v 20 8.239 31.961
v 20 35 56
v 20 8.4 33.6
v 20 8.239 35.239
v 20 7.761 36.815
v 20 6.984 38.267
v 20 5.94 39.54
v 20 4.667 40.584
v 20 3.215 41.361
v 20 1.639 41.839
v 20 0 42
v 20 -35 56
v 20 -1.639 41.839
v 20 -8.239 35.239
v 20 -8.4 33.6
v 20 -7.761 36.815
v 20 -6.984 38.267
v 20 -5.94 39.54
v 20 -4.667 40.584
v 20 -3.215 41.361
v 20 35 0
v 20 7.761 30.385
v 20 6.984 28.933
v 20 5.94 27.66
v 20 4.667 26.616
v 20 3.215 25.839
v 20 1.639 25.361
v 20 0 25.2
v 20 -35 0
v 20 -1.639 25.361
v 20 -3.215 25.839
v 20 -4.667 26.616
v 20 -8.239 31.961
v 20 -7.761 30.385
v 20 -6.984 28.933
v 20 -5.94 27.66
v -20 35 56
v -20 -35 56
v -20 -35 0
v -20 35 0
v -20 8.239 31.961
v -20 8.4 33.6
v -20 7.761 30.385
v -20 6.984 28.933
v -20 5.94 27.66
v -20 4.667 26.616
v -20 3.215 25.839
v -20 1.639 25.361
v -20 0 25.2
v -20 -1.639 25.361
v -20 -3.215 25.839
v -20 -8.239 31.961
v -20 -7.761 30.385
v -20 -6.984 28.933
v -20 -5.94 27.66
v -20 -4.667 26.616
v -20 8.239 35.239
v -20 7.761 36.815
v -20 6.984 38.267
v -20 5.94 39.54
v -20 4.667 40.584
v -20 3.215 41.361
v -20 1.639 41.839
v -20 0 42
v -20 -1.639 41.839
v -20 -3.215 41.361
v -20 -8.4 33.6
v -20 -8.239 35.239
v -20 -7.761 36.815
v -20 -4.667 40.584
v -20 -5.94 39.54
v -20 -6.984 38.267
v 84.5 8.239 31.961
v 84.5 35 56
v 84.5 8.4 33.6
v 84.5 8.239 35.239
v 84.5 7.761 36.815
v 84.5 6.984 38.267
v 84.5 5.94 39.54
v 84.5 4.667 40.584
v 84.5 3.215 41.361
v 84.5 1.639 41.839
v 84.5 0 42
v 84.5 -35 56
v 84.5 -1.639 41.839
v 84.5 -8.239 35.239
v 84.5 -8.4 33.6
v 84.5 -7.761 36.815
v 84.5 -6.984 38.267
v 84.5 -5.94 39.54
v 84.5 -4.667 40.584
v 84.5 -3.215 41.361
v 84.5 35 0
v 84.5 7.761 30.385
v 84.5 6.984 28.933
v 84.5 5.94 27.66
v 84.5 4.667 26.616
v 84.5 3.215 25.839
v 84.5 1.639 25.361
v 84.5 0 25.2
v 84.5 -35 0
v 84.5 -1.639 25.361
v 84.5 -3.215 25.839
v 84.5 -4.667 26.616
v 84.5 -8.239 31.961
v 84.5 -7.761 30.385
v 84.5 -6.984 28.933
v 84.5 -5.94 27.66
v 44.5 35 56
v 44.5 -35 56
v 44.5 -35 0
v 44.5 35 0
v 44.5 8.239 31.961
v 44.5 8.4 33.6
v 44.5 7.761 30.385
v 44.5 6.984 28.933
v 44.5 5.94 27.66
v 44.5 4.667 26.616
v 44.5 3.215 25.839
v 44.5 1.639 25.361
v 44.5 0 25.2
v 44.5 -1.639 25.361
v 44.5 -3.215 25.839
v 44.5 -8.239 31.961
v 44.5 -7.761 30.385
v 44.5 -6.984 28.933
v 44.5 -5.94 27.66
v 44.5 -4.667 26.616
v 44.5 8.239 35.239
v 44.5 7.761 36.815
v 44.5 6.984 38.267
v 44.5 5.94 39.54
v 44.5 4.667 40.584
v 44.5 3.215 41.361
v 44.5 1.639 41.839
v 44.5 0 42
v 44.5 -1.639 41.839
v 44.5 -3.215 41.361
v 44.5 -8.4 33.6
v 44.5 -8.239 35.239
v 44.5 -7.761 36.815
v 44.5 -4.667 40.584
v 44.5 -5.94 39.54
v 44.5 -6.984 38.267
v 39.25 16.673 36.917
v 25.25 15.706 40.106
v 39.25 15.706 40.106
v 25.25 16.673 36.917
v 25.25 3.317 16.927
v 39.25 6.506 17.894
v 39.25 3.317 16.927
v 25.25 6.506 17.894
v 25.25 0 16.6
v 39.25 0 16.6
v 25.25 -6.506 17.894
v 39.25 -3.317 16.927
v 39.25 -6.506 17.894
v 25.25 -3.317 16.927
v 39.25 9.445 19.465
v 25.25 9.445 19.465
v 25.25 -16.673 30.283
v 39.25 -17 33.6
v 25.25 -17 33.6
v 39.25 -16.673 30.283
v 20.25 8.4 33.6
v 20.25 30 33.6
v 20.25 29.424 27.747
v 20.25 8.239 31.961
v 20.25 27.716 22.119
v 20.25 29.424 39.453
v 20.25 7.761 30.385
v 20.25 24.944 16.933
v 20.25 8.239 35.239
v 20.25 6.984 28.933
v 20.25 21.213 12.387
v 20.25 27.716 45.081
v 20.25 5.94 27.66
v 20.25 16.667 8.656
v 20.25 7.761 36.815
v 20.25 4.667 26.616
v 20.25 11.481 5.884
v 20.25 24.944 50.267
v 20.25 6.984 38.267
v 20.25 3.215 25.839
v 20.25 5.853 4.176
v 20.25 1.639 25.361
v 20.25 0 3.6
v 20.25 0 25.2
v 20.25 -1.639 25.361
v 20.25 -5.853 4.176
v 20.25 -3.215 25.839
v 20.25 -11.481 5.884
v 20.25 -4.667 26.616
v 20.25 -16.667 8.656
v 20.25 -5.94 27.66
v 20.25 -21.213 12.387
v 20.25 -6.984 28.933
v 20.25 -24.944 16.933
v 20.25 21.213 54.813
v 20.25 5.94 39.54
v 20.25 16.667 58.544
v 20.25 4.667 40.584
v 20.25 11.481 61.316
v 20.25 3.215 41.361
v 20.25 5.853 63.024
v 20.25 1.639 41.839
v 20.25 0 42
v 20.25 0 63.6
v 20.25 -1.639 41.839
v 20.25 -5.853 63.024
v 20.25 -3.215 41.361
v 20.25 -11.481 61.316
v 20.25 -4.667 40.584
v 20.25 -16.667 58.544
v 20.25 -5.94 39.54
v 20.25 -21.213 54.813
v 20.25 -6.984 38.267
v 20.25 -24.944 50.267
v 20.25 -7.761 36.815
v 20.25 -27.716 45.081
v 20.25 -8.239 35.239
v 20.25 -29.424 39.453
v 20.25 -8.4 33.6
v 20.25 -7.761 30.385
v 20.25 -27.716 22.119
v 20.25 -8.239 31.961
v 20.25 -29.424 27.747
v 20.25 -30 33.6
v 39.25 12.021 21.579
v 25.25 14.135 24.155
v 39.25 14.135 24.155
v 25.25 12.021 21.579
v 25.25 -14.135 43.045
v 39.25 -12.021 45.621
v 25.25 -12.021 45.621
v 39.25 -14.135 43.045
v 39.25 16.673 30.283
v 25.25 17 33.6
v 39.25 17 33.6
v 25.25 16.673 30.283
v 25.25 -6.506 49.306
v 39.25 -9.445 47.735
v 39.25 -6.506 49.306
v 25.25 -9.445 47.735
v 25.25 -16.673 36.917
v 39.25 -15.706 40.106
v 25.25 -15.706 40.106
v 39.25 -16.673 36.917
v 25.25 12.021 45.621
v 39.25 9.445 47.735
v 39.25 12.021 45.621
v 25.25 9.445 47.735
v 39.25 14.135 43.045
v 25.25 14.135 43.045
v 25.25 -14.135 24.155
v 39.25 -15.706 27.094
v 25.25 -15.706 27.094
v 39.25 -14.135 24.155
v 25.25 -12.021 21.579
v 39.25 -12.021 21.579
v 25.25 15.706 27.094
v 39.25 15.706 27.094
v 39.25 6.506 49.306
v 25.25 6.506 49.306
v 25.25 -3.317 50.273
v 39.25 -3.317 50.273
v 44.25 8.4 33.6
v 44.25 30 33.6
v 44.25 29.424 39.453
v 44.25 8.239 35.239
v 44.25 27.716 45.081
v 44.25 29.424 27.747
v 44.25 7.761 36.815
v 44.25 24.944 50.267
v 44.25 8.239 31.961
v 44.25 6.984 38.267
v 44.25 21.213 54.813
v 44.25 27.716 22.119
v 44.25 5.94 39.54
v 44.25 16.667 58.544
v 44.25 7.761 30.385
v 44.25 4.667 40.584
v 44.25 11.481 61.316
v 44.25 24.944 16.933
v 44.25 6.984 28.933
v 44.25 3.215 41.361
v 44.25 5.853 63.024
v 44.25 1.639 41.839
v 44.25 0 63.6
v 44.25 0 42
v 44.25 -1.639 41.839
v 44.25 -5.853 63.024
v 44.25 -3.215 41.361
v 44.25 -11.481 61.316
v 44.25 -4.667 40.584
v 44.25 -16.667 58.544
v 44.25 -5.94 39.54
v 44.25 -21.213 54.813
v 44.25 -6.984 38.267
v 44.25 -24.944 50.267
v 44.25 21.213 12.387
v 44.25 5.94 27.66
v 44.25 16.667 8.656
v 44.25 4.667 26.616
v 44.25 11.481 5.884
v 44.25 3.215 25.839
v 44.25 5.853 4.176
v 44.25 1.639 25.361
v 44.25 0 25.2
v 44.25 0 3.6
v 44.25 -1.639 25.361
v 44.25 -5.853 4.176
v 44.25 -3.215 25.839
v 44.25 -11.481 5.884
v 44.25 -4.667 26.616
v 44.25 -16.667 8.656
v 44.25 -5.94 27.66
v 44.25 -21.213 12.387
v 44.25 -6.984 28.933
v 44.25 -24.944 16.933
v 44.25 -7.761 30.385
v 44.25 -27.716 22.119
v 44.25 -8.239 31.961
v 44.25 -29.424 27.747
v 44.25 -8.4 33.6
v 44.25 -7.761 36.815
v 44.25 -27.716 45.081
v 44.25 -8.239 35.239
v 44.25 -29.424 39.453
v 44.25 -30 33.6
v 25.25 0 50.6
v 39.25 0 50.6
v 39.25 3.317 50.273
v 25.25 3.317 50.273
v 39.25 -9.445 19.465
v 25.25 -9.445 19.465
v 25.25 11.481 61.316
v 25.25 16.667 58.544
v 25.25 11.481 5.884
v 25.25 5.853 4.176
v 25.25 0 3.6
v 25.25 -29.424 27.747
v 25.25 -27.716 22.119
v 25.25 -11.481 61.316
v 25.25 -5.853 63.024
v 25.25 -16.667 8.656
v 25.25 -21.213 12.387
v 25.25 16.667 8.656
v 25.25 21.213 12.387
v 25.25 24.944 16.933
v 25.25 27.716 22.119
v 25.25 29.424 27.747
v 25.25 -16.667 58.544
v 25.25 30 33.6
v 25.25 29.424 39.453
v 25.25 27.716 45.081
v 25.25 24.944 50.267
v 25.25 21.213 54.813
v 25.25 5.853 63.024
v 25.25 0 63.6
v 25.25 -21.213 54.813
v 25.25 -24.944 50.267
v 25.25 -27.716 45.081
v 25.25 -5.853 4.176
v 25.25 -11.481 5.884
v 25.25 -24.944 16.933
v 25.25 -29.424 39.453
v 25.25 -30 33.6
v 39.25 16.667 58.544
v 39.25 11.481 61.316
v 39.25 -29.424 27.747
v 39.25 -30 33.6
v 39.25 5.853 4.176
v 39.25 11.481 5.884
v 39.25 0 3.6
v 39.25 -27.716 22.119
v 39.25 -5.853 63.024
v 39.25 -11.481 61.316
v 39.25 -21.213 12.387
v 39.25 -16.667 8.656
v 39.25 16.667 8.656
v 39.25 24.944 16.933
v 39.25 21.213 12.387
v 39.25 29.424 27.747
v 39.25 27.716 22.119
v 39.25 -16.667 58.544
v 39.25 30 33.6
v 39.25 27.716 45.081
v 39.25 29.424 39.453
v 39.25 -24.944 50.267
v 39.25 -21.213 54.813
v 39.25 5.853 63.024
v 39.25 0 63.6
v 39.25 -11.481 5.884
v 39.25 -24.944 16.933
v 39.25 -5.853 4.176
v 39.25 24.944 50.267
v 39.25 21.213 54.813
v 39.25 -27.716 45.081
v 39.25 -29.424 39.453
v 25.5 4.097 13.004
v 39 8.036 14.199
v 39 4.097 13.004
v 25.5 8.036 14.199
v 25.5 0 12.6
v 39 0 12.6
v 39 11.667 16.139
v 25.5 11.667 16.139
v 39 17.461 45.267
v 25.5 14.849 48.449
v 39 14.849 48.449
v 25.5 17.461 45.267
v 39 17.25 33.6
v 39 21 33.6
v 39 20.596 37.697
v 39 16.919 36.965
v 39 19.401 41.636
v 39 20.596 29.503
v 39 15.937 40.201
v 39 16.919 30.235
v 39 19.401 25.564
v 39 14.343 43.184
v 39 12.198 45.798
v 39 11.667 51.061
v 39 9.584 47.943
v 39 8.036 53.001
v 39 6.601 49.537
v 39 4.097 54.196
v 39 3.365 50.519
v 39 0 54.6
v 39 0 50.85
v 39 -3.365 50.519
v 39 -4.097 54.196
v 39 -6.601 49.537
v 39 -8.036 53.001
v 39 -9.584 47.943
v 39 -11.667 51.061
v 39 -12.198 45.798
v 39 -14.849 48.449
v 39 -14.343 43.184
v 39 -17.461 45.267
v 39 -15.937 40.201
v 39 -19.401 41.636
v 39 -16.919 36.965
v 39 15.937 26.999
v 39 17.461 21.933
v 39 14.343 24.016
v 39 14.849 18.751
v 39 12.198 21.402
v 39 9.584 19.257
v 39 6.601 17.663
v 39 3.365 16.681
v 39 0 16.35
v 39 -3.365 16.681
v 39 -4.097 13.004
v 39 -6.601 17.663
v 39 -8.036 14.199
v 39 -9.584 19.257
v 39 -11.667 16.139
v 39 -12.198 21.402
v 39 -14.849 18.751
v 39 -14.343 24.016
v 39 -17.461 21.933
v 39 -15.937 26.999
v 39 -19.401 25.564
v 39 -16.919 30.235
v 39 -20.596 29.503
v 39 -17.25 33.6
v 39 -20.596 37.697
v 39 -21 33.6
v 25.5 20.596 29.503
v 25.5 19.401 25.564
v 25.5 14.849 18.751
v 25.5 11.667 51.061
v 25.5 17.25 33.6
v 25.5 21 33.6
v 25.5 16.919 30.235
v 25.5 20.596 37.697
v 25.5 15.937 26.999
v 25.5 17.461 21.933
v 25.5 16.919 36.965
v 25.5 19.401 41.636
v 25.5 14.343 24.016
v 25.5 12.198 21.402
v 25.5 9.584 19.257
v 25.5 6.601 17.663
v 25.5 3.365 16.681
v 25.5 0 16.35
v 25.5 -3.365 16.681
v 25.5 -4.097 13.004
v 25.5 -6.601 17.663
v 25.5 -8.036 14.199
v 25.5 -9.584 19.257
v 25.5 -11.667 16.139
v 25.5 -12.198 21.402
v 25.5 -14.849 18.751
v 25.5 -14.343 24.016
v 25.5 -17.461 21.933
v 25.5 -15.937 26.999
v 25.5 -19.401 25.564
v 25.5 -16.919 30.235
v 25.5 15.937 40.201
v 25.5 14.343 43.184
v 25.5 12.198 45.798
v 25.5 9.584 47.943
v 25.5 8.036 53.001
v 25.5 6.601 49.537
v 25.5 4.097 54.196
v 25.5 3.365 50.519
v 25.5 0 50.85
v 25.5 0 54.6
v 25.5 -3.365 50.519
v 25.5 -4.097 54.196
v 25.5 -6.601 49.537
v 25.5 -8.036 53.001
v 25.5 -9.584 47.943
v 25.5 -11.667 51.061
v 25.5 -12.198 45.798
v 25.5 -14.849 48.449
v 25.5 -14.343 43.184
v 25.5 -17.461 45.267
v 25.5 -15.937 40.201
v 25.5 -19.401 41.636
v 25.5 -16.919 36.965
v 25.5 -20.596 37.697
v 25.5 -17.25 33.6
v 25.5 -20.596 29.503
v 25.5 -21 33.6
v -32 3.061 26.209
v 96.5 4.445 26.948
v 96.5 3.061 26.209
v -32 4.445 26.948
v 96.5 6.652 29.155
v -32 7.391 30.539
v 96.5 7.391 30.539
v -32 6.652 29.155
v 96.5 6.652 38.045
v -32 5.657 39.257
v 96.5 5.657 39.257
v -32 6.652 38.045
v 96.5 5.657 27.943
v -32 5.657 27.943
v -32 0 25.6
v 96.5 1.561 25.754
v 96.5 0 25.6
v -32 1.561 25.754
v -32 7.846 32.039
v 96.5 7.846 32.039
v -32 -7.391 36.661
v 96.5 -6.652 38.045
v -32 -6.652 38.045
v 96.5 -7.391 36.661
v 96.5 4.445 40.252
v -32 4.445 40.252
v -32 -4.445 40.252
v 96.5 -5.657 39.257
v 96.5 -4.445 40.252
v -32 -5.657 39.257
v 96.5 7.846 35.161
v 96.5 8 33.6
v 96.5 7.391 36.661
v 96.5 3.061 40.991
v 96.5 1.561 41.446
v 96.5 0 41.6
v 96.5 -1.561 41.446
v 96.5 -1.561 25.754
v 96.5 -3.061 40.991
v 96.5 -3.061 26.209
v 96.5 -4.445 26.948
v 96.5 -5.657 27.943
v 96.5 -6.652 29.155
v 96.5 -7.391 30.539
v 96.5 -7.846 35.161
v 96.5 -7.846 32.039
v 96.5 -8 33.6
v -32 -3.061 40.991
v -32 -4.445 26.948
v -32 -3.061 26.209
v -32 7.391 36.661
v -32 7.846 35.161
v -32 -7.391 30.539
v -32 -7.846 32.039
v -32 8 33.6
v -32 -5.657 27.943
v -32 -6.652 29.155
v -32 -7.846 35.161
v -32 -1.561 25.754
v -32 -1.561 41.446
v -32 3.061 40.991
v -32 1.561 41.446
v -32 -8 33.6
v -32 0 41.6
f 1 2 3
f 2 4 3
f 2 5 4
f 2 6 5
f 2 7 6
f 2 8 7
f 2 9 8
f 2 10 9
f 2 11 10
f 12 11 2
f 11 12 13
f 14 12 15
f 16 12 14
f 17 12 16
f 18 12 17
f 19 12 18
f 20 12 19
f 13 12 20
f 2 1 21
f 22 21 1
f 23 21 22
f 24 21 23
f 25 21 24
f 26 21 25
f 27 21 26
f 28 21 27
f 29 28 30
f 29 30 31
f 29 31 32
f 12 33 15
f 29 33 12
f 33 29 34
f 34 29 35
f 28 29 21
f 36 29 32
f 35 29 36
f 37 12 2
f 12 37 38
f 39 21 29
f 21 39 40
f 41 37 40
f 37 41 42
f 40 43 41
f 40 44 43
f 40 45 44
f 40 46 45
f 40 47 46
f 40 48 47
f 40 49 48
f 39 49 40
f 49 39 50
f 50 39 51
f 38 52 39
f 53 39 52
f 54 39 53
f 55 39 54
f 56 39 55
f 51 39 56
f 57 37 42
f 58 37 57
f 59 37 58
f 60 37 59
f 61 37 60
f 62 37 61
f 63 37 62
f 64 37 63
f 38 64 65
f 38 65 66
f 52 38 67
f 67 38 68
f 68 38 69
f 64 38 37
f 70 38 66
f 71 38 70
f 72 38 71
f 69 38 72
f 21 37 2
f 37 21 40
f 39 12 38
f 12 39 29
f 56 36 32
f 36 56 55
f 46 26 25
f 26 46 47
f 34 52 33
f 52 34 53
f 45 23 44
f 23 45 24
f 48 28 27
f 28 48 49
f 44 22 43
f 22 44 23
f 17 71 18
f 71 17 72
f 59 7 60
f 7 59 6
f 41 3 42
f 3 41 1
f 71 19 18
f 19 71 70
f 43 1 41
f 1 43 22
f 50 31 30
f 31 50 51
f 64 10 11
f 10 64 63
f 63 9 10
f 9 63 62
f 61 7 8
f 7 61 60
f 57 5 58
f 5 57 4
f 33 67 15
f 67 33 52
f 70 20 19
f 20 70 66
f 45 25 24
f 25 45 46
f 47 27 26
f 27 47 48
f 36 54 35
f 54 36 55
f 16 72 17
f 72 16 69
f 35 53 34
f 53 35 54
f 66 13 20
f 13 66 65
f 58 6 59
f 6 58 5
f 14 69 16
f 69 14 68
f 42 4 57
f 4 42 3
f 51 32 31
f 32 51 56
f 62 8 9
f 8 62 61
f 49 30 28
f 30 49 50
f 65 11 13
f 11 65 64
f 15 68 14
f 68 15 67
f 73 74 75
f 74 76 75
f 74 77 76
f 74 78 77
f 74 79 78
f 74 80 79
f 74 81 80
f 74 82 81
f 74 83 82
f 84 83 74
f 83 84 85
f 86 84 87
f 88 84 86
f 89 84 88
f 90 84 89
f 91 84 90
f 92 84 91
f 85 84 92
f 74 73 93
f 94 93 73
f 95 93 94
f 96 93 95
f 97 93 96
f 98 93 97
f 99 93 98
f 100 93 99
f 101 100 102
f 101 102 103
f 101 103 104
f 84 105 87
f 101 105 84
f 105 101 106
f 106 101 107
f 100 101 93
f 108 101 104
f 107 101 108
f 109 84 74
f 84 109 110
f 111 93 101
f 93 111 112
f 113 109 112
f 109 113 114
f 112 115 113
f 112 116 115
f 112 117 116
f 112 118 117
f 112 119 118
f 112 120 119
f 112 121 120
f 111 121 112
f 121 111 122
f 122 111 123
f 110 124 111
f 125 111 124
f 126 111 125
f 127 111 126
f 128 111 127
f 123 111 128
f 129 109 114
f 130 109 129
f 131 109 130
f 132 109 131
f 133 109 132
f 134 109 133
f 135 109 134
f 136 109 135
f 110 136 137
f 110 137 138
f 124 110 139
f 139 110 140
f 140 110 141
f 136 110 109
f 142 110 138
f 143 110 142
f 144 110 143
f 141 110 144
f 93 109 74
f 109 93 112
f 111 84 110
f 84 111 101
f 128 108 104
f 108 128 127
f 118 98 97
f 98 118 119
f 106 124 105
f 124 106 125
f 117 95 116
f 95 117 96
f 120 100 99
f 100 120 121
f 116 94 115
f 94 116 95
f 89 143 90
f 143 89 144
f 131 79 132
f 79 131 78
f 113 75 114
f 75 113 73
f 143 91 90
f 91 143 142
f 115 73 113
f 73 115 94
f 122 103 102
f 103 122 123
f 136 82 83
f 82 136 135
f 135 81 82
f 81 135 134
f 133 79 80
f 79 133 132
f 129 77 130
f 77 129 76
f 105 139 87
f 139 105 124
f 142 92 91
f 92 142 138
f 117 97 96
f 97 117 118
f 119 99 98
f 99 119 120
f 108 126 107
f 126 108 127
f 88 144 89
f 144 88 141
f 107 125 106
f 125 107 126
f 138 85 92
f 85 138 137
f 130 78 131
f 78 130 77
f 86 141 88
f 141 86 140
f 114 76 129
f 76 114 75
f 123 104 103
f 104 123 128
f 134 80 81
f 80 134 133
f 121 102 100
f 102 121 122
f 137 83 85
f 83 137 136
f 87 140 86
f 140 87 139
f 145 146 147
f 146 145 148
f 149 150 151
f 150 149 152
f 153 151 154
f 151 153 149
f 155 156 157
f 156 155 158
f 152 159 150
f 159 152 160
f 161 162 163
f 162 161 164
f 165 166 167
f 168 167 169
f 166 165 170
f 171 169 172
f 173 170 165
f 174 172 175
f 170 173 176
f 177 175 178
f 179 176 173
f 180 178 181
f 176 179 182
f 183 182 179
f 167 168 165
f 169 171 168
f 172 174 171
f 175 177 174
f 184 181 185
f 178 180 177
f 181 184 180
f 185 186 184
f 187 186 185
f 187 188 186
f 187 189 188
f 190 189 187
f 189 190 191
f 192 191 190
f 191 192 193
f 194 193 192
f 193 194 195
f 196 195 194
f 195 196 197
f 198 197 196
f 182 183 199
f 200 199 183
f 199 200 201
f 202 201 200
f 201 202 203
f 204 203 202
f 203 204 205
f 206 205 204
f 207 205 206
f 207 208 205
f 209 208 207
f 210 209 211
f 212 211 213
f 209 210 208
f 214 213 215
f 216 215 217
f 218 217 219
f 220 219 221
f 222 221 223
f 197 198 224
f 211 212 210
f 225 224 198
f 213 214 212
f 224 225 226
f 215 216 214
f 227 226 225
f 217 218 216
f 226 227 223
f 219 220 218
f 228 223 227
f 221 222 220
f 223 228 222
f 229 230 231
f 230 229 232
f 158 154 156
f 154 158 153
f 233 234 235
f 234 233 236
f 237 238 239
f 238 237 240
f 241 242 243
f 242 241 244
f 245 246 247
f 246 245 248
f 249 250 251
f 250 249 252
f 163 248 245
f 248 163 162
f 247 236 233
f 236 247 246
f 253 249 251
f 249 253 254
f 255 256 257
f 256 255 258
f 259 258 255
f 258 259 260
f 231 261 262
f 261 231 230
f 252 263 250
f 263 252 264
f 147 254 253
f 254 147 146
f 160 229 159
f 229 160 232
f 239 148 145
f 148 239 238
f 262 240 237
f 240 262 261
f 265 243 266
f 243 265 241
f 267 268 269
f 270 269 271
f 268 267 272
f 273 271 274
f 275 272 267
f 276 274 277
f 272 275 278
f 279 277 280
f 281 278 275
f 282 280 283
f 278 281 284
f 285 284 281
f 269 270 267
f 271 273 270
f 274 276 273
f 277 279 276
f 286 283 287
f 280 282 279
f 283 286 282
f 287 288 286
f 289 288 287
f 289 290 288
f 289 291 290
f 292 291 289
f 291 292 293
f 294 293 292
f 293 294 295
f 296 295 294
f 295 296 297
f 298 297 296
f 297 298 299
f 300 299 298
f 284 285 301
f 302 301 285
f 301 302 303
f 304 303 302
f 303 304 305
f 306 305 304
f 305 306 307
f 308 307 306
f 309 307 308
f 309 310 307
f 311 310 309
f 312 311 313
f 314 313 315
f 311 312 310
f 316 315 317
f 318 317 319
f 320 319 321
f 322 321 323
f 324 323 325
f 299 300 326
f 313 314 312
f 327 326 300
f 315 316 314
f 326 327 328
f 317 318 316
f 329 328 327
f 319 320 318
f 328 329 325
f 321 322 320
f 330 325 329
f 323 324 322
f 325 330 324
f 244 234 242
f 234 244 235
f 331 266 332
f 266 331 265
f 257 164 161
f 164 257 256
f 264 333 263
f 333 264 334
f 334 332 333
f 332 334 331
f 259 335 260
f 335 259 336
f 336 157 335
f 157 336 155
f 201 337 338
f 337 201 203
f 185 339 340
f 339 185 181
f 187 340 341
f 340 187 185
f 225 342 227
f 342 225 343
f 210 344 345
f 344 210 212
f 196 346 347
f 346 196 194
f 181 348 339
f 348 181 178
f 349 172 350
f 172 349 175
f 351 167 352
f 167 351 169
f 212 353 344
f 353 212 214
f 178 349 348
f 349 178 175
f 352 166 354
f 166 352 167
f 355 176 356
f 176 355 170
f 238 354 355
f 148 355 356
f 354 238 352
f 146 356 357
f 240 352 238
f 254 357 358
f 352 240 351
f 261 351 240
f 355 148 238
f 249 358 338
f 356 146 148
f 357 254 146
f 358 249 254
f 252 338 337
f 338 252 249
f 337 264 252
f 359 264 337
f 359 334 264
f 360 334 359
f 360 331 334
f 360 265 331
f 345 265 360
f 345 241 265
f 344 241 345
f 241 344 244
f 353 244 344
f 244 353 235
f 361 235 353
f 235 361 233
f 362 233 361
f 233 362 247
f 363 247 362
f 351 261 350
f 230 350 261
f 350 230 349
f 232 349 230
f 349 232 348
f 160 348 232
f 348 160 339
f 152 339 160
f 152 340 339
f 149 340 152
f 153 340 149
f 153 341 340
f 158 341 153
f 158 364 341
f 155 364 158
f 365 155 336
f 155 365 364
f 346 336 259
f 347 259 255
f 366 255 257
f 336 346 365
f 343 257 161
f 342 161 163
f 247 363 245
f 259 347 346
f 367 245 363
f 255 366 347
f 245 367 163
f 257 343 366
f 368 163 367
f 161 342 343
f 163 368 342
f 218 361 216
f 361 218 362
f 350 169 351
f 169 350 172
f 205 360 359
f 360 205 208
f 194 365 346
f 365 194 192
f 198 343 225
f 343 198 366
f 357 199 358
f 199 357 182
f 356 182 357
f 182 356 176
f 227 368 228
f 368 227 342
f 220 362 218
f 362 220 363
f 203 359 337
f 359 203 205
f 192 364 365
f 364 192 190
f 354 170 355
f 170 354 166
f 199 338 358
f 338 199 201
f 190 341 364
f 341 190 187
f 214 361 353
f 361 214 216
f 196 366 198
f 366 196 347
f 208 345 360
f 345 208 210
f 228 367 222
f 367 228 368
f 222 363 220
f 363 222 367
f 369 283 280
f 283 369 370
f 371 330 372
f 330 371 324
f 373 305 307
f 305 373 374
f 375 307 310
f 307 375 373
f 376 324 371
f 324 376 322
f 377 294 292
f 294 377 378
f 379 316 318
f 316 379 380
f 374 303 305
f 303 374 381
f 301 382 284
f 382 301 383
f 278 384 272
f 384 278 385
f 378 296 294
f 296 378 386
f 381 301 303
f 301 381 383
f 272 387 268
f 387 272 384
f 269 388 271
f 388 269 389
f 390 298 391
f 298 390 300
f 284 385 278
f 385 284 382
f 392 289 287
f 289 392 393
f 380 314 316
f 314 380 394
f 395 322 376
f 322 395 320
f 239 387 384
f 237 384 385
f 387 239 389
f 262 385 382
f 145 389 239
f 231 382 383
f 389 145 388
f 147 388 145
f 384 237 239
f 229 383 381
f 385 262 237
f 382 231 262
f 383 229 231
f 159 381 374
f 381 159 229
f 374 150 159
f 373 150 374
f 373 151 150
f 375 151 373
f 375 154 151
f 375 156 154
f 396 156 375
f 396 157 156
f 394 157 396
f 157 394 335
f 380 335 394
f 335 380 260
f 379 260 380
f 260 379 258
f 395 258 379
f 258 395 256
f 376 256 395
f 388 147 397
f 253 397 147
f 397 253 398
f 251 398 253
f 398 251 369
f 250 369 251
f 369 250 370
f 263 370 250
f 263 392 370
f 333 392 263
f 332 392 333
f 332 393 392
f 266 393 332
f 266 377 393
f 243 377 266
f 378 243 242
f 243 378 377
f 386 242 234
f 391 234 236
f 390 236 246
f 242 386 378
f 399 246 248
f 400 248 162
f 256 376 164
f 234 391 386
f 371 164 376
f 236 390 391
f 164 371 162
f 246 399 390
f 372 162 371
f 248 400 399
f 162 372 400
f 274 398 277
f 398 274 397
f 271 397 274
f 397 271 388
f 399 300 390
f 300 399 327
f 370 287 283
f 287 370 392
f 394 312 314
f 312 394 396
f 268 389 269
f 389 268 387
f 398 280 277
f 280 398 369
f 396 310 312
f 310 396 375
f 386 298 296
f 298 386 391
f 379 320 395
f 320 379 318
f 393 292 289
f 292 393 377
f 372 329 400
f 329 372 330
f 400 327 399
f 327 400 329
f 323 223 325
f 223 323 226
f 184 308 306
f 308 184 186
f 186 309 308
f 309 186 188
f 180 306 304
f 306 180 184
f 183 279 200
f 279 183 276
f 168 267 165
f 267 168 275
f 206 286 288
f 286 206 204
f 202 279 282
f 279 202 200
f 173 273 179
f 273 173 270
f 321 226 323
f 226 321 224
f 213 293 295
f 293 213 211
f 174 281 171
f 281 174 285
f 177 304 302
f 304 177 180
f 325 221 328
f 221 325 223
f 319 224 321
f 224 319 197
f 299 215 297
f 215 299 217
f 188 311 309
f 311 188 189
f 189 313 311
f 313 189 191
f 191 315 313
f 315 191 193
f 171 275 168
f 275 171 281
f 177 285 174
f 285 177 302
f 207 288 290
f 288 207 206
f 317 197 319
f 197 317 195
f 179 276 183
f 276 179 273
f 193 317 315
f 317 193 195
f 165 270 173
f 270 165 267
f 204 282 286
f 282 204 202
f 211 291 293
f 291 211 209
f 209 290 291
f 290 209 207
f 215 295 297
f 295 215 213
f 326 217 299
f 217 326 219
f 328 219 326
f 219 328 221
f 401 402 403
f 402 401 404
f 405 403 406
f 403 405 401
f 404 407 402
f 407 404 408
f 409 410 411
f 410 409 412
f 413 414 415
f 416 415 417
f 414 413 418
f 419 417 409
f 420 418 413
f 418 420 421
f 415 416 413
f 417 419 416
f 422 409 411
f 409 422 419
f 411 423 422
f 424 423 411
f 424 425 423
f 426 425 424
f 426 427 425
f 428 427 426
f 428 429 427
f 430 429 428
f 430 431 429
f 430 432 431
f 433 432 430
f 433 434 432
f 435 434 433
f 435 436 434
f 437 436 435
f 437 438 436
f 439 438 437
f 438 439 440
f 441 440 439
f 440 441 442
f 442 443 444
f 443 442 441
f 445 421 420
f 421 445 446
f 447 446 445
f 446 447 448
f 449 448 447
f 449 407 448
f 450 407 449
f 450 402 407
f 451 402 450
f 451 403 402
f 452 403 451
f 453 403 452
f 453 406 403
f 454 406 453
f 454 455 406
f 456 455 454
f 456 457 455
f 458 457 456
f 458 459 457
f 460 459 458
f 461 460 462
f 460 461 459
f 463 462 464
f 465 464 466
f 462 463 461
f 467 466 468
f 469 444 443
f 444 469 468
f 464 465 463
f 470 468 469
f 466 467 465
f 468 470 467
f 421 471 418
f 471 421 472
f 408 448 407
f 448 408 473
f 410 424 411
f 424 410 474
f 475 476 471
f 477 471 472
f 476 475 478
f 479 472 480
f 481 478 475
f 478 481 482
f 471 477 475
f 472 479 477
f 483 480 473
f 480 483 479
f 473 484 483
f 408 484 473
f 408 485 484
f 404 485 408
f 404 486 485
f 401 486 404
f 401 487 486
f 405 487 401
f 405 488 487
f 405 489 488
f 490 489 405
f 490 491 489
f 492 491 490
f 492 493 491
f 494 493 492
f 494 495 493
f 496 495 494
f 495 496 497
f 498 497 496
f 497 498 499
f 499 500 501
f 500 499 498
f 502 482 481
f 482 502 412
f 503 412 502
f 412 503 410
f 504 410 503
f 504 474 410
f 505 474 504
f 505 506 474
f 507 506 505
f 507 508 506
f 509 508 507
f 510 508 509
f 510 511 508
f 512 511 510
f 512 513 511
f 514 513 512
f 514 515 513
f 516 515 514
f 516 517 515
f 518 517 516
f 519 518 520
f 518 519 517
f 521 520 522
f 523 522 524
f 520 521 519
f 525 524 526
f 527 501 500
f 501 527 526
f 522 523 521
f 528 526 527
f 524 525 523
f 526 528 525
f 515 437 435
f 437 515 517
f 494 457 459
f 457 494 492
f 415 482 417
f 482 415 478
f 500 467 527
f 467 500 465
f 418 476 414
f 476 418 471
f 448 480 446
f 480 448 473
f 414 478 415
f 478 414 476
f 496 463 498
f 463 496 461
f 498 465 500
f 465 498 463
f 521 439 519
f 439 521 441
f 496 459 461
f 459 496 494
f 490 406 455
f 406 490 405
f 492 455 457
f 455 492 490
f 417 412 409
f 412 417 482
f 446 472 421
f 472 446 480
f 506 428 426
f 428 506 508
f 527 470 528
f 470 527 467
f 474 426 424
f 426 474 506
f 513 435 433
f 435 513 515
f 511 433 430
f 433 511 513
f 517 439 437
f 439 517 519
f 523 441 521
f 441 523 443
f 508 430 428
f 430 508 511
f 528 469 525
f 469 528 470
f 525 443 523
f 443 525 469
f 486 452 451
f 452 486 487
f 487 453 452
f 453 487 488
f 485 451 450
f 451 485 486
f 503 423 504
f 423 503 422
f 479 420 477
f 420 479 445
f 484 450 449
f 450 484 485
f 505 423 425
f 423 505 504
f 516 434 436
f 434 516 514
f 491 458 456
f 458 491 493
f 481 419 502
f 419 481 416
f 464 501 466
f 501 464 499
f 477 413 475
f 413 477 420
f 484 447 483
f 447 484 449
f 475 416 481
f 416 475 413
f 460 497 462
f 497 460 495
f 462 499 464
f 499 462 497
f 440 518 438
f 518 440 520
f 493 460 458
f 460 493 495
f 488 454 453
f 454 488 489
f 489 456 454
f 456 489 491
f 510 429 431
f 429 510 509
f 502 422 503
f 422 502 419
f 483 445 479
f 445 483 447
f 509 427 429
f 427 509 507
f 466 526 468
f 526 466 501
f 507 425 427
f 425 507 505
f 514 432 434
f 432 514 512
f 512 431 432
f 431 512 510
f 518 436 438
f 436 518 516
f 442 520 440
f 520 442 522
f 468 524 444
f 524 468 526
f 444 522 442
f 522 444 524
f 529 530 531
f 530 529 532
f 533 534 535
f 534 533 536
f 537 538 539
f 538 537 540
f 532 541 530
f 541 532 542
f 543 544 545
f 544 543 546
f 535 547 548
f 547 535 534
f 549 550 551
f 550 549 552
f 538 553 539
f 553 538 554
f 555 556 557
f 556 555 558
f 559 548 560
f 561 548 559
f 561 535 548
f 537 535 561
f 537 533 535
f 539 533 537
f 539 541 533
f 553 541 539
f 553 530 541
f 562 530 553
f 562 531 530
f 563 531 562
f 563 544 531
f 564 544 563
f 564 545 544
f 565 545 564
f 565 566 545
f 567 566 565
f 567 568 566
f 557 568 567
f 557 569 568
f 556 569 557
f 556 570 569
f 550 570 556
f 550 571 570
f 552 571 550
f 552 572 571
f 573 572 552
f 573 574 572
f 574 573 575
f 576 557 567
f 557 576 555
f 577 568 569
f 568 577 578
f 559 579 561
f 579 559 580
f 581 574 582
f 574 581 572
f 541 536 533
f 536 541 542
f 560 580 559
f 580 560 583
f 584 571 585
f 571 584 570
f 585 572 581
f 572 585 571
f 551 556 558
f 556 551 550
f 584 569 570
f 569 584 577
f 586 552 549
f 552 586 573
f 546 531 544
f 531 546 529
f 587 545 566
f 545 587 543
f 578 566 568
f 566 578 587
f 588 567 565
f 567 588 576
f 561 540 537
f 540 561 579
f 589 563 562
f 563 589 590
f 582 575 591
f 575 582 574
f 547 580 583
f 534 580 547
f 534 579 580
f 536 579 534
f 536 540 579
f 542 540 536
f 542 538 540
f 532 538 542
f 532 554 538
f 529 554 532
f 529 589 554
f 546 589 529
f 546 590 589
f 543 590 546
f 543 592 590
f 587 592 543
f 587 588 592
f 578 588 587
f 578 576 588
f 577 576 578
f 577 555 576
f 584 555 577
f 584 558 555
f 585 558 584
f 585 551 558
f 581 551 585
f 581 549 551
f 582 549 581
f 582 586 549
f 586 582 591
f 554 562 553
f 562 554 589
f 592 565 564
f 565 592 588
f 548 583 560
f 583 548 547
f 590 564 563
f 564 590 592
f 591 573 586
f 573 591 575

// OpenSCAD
$fn = 32;

// ------------------------------------------------------------------------
// Pulley assembly: d60 pulley with a belt, shaft d16
// Every part is its own module, assembly() places them once.
// ------------------------------------------------------------------------

// --- part 1 ---
module support1() {
  difference() {
    translate([-20, -35, 0]) cube([40, 70, 56]);
    translate([0, 0, 33.6]) rotate([0, 90, 0]) cylinder(h = 42, d = 16.8, center = true);
  }
}

// --- part 2 ---
module support2() {
  difference() {
    translate([-20, -35, 0]) cube([40, 70, 56]);
    translate([0, 0, 33.6]) rotate([0, 90, 0]) cylinder(h = 42, d = 16.8, center = true);
  }
}

// --- part 3 ---
module shaft() {
  translate([0, 0, -64.25]) cylinder(h = 128.5, d = 16);
}

// --- part 4 ---
module pulley() {
  difference() {
    union() {
      cylinder(h = 24, d = 34);
      cylinder(h = 5, d = 60);
      translate([0, 0, 19]) cylinder(h = 5, d = 60);
    }
    translate([0, 0, -1]) cylinder(h = 26, d = 16.8);
  }
}

// --- part 5 ---
module belt() {
  difference() {
      translate([0, 0, 0]) cylinder(h = 13.5, d = 42);
      translate([0, 0, -1]) cylinder(h = 15.5, d = 34.5);
    }
}

// --- assembly ---
module assembly() {
  translate([0, 0, 0]) rotate([0, 0, 0]) support1();
  translate([64.5, 0, 0]) rotate([0, 0, 0]) support2();
  translate([32.25, 0, 33.6]) rotate([0, 90, 0]) shaft();
  translate([20.25, 0, 33.6]) rotate([0, 90, 0]) pulley();
  translate([25.5, 0, 33.6]) rotate([0, 90, 0]) belt();
}

assembly();
